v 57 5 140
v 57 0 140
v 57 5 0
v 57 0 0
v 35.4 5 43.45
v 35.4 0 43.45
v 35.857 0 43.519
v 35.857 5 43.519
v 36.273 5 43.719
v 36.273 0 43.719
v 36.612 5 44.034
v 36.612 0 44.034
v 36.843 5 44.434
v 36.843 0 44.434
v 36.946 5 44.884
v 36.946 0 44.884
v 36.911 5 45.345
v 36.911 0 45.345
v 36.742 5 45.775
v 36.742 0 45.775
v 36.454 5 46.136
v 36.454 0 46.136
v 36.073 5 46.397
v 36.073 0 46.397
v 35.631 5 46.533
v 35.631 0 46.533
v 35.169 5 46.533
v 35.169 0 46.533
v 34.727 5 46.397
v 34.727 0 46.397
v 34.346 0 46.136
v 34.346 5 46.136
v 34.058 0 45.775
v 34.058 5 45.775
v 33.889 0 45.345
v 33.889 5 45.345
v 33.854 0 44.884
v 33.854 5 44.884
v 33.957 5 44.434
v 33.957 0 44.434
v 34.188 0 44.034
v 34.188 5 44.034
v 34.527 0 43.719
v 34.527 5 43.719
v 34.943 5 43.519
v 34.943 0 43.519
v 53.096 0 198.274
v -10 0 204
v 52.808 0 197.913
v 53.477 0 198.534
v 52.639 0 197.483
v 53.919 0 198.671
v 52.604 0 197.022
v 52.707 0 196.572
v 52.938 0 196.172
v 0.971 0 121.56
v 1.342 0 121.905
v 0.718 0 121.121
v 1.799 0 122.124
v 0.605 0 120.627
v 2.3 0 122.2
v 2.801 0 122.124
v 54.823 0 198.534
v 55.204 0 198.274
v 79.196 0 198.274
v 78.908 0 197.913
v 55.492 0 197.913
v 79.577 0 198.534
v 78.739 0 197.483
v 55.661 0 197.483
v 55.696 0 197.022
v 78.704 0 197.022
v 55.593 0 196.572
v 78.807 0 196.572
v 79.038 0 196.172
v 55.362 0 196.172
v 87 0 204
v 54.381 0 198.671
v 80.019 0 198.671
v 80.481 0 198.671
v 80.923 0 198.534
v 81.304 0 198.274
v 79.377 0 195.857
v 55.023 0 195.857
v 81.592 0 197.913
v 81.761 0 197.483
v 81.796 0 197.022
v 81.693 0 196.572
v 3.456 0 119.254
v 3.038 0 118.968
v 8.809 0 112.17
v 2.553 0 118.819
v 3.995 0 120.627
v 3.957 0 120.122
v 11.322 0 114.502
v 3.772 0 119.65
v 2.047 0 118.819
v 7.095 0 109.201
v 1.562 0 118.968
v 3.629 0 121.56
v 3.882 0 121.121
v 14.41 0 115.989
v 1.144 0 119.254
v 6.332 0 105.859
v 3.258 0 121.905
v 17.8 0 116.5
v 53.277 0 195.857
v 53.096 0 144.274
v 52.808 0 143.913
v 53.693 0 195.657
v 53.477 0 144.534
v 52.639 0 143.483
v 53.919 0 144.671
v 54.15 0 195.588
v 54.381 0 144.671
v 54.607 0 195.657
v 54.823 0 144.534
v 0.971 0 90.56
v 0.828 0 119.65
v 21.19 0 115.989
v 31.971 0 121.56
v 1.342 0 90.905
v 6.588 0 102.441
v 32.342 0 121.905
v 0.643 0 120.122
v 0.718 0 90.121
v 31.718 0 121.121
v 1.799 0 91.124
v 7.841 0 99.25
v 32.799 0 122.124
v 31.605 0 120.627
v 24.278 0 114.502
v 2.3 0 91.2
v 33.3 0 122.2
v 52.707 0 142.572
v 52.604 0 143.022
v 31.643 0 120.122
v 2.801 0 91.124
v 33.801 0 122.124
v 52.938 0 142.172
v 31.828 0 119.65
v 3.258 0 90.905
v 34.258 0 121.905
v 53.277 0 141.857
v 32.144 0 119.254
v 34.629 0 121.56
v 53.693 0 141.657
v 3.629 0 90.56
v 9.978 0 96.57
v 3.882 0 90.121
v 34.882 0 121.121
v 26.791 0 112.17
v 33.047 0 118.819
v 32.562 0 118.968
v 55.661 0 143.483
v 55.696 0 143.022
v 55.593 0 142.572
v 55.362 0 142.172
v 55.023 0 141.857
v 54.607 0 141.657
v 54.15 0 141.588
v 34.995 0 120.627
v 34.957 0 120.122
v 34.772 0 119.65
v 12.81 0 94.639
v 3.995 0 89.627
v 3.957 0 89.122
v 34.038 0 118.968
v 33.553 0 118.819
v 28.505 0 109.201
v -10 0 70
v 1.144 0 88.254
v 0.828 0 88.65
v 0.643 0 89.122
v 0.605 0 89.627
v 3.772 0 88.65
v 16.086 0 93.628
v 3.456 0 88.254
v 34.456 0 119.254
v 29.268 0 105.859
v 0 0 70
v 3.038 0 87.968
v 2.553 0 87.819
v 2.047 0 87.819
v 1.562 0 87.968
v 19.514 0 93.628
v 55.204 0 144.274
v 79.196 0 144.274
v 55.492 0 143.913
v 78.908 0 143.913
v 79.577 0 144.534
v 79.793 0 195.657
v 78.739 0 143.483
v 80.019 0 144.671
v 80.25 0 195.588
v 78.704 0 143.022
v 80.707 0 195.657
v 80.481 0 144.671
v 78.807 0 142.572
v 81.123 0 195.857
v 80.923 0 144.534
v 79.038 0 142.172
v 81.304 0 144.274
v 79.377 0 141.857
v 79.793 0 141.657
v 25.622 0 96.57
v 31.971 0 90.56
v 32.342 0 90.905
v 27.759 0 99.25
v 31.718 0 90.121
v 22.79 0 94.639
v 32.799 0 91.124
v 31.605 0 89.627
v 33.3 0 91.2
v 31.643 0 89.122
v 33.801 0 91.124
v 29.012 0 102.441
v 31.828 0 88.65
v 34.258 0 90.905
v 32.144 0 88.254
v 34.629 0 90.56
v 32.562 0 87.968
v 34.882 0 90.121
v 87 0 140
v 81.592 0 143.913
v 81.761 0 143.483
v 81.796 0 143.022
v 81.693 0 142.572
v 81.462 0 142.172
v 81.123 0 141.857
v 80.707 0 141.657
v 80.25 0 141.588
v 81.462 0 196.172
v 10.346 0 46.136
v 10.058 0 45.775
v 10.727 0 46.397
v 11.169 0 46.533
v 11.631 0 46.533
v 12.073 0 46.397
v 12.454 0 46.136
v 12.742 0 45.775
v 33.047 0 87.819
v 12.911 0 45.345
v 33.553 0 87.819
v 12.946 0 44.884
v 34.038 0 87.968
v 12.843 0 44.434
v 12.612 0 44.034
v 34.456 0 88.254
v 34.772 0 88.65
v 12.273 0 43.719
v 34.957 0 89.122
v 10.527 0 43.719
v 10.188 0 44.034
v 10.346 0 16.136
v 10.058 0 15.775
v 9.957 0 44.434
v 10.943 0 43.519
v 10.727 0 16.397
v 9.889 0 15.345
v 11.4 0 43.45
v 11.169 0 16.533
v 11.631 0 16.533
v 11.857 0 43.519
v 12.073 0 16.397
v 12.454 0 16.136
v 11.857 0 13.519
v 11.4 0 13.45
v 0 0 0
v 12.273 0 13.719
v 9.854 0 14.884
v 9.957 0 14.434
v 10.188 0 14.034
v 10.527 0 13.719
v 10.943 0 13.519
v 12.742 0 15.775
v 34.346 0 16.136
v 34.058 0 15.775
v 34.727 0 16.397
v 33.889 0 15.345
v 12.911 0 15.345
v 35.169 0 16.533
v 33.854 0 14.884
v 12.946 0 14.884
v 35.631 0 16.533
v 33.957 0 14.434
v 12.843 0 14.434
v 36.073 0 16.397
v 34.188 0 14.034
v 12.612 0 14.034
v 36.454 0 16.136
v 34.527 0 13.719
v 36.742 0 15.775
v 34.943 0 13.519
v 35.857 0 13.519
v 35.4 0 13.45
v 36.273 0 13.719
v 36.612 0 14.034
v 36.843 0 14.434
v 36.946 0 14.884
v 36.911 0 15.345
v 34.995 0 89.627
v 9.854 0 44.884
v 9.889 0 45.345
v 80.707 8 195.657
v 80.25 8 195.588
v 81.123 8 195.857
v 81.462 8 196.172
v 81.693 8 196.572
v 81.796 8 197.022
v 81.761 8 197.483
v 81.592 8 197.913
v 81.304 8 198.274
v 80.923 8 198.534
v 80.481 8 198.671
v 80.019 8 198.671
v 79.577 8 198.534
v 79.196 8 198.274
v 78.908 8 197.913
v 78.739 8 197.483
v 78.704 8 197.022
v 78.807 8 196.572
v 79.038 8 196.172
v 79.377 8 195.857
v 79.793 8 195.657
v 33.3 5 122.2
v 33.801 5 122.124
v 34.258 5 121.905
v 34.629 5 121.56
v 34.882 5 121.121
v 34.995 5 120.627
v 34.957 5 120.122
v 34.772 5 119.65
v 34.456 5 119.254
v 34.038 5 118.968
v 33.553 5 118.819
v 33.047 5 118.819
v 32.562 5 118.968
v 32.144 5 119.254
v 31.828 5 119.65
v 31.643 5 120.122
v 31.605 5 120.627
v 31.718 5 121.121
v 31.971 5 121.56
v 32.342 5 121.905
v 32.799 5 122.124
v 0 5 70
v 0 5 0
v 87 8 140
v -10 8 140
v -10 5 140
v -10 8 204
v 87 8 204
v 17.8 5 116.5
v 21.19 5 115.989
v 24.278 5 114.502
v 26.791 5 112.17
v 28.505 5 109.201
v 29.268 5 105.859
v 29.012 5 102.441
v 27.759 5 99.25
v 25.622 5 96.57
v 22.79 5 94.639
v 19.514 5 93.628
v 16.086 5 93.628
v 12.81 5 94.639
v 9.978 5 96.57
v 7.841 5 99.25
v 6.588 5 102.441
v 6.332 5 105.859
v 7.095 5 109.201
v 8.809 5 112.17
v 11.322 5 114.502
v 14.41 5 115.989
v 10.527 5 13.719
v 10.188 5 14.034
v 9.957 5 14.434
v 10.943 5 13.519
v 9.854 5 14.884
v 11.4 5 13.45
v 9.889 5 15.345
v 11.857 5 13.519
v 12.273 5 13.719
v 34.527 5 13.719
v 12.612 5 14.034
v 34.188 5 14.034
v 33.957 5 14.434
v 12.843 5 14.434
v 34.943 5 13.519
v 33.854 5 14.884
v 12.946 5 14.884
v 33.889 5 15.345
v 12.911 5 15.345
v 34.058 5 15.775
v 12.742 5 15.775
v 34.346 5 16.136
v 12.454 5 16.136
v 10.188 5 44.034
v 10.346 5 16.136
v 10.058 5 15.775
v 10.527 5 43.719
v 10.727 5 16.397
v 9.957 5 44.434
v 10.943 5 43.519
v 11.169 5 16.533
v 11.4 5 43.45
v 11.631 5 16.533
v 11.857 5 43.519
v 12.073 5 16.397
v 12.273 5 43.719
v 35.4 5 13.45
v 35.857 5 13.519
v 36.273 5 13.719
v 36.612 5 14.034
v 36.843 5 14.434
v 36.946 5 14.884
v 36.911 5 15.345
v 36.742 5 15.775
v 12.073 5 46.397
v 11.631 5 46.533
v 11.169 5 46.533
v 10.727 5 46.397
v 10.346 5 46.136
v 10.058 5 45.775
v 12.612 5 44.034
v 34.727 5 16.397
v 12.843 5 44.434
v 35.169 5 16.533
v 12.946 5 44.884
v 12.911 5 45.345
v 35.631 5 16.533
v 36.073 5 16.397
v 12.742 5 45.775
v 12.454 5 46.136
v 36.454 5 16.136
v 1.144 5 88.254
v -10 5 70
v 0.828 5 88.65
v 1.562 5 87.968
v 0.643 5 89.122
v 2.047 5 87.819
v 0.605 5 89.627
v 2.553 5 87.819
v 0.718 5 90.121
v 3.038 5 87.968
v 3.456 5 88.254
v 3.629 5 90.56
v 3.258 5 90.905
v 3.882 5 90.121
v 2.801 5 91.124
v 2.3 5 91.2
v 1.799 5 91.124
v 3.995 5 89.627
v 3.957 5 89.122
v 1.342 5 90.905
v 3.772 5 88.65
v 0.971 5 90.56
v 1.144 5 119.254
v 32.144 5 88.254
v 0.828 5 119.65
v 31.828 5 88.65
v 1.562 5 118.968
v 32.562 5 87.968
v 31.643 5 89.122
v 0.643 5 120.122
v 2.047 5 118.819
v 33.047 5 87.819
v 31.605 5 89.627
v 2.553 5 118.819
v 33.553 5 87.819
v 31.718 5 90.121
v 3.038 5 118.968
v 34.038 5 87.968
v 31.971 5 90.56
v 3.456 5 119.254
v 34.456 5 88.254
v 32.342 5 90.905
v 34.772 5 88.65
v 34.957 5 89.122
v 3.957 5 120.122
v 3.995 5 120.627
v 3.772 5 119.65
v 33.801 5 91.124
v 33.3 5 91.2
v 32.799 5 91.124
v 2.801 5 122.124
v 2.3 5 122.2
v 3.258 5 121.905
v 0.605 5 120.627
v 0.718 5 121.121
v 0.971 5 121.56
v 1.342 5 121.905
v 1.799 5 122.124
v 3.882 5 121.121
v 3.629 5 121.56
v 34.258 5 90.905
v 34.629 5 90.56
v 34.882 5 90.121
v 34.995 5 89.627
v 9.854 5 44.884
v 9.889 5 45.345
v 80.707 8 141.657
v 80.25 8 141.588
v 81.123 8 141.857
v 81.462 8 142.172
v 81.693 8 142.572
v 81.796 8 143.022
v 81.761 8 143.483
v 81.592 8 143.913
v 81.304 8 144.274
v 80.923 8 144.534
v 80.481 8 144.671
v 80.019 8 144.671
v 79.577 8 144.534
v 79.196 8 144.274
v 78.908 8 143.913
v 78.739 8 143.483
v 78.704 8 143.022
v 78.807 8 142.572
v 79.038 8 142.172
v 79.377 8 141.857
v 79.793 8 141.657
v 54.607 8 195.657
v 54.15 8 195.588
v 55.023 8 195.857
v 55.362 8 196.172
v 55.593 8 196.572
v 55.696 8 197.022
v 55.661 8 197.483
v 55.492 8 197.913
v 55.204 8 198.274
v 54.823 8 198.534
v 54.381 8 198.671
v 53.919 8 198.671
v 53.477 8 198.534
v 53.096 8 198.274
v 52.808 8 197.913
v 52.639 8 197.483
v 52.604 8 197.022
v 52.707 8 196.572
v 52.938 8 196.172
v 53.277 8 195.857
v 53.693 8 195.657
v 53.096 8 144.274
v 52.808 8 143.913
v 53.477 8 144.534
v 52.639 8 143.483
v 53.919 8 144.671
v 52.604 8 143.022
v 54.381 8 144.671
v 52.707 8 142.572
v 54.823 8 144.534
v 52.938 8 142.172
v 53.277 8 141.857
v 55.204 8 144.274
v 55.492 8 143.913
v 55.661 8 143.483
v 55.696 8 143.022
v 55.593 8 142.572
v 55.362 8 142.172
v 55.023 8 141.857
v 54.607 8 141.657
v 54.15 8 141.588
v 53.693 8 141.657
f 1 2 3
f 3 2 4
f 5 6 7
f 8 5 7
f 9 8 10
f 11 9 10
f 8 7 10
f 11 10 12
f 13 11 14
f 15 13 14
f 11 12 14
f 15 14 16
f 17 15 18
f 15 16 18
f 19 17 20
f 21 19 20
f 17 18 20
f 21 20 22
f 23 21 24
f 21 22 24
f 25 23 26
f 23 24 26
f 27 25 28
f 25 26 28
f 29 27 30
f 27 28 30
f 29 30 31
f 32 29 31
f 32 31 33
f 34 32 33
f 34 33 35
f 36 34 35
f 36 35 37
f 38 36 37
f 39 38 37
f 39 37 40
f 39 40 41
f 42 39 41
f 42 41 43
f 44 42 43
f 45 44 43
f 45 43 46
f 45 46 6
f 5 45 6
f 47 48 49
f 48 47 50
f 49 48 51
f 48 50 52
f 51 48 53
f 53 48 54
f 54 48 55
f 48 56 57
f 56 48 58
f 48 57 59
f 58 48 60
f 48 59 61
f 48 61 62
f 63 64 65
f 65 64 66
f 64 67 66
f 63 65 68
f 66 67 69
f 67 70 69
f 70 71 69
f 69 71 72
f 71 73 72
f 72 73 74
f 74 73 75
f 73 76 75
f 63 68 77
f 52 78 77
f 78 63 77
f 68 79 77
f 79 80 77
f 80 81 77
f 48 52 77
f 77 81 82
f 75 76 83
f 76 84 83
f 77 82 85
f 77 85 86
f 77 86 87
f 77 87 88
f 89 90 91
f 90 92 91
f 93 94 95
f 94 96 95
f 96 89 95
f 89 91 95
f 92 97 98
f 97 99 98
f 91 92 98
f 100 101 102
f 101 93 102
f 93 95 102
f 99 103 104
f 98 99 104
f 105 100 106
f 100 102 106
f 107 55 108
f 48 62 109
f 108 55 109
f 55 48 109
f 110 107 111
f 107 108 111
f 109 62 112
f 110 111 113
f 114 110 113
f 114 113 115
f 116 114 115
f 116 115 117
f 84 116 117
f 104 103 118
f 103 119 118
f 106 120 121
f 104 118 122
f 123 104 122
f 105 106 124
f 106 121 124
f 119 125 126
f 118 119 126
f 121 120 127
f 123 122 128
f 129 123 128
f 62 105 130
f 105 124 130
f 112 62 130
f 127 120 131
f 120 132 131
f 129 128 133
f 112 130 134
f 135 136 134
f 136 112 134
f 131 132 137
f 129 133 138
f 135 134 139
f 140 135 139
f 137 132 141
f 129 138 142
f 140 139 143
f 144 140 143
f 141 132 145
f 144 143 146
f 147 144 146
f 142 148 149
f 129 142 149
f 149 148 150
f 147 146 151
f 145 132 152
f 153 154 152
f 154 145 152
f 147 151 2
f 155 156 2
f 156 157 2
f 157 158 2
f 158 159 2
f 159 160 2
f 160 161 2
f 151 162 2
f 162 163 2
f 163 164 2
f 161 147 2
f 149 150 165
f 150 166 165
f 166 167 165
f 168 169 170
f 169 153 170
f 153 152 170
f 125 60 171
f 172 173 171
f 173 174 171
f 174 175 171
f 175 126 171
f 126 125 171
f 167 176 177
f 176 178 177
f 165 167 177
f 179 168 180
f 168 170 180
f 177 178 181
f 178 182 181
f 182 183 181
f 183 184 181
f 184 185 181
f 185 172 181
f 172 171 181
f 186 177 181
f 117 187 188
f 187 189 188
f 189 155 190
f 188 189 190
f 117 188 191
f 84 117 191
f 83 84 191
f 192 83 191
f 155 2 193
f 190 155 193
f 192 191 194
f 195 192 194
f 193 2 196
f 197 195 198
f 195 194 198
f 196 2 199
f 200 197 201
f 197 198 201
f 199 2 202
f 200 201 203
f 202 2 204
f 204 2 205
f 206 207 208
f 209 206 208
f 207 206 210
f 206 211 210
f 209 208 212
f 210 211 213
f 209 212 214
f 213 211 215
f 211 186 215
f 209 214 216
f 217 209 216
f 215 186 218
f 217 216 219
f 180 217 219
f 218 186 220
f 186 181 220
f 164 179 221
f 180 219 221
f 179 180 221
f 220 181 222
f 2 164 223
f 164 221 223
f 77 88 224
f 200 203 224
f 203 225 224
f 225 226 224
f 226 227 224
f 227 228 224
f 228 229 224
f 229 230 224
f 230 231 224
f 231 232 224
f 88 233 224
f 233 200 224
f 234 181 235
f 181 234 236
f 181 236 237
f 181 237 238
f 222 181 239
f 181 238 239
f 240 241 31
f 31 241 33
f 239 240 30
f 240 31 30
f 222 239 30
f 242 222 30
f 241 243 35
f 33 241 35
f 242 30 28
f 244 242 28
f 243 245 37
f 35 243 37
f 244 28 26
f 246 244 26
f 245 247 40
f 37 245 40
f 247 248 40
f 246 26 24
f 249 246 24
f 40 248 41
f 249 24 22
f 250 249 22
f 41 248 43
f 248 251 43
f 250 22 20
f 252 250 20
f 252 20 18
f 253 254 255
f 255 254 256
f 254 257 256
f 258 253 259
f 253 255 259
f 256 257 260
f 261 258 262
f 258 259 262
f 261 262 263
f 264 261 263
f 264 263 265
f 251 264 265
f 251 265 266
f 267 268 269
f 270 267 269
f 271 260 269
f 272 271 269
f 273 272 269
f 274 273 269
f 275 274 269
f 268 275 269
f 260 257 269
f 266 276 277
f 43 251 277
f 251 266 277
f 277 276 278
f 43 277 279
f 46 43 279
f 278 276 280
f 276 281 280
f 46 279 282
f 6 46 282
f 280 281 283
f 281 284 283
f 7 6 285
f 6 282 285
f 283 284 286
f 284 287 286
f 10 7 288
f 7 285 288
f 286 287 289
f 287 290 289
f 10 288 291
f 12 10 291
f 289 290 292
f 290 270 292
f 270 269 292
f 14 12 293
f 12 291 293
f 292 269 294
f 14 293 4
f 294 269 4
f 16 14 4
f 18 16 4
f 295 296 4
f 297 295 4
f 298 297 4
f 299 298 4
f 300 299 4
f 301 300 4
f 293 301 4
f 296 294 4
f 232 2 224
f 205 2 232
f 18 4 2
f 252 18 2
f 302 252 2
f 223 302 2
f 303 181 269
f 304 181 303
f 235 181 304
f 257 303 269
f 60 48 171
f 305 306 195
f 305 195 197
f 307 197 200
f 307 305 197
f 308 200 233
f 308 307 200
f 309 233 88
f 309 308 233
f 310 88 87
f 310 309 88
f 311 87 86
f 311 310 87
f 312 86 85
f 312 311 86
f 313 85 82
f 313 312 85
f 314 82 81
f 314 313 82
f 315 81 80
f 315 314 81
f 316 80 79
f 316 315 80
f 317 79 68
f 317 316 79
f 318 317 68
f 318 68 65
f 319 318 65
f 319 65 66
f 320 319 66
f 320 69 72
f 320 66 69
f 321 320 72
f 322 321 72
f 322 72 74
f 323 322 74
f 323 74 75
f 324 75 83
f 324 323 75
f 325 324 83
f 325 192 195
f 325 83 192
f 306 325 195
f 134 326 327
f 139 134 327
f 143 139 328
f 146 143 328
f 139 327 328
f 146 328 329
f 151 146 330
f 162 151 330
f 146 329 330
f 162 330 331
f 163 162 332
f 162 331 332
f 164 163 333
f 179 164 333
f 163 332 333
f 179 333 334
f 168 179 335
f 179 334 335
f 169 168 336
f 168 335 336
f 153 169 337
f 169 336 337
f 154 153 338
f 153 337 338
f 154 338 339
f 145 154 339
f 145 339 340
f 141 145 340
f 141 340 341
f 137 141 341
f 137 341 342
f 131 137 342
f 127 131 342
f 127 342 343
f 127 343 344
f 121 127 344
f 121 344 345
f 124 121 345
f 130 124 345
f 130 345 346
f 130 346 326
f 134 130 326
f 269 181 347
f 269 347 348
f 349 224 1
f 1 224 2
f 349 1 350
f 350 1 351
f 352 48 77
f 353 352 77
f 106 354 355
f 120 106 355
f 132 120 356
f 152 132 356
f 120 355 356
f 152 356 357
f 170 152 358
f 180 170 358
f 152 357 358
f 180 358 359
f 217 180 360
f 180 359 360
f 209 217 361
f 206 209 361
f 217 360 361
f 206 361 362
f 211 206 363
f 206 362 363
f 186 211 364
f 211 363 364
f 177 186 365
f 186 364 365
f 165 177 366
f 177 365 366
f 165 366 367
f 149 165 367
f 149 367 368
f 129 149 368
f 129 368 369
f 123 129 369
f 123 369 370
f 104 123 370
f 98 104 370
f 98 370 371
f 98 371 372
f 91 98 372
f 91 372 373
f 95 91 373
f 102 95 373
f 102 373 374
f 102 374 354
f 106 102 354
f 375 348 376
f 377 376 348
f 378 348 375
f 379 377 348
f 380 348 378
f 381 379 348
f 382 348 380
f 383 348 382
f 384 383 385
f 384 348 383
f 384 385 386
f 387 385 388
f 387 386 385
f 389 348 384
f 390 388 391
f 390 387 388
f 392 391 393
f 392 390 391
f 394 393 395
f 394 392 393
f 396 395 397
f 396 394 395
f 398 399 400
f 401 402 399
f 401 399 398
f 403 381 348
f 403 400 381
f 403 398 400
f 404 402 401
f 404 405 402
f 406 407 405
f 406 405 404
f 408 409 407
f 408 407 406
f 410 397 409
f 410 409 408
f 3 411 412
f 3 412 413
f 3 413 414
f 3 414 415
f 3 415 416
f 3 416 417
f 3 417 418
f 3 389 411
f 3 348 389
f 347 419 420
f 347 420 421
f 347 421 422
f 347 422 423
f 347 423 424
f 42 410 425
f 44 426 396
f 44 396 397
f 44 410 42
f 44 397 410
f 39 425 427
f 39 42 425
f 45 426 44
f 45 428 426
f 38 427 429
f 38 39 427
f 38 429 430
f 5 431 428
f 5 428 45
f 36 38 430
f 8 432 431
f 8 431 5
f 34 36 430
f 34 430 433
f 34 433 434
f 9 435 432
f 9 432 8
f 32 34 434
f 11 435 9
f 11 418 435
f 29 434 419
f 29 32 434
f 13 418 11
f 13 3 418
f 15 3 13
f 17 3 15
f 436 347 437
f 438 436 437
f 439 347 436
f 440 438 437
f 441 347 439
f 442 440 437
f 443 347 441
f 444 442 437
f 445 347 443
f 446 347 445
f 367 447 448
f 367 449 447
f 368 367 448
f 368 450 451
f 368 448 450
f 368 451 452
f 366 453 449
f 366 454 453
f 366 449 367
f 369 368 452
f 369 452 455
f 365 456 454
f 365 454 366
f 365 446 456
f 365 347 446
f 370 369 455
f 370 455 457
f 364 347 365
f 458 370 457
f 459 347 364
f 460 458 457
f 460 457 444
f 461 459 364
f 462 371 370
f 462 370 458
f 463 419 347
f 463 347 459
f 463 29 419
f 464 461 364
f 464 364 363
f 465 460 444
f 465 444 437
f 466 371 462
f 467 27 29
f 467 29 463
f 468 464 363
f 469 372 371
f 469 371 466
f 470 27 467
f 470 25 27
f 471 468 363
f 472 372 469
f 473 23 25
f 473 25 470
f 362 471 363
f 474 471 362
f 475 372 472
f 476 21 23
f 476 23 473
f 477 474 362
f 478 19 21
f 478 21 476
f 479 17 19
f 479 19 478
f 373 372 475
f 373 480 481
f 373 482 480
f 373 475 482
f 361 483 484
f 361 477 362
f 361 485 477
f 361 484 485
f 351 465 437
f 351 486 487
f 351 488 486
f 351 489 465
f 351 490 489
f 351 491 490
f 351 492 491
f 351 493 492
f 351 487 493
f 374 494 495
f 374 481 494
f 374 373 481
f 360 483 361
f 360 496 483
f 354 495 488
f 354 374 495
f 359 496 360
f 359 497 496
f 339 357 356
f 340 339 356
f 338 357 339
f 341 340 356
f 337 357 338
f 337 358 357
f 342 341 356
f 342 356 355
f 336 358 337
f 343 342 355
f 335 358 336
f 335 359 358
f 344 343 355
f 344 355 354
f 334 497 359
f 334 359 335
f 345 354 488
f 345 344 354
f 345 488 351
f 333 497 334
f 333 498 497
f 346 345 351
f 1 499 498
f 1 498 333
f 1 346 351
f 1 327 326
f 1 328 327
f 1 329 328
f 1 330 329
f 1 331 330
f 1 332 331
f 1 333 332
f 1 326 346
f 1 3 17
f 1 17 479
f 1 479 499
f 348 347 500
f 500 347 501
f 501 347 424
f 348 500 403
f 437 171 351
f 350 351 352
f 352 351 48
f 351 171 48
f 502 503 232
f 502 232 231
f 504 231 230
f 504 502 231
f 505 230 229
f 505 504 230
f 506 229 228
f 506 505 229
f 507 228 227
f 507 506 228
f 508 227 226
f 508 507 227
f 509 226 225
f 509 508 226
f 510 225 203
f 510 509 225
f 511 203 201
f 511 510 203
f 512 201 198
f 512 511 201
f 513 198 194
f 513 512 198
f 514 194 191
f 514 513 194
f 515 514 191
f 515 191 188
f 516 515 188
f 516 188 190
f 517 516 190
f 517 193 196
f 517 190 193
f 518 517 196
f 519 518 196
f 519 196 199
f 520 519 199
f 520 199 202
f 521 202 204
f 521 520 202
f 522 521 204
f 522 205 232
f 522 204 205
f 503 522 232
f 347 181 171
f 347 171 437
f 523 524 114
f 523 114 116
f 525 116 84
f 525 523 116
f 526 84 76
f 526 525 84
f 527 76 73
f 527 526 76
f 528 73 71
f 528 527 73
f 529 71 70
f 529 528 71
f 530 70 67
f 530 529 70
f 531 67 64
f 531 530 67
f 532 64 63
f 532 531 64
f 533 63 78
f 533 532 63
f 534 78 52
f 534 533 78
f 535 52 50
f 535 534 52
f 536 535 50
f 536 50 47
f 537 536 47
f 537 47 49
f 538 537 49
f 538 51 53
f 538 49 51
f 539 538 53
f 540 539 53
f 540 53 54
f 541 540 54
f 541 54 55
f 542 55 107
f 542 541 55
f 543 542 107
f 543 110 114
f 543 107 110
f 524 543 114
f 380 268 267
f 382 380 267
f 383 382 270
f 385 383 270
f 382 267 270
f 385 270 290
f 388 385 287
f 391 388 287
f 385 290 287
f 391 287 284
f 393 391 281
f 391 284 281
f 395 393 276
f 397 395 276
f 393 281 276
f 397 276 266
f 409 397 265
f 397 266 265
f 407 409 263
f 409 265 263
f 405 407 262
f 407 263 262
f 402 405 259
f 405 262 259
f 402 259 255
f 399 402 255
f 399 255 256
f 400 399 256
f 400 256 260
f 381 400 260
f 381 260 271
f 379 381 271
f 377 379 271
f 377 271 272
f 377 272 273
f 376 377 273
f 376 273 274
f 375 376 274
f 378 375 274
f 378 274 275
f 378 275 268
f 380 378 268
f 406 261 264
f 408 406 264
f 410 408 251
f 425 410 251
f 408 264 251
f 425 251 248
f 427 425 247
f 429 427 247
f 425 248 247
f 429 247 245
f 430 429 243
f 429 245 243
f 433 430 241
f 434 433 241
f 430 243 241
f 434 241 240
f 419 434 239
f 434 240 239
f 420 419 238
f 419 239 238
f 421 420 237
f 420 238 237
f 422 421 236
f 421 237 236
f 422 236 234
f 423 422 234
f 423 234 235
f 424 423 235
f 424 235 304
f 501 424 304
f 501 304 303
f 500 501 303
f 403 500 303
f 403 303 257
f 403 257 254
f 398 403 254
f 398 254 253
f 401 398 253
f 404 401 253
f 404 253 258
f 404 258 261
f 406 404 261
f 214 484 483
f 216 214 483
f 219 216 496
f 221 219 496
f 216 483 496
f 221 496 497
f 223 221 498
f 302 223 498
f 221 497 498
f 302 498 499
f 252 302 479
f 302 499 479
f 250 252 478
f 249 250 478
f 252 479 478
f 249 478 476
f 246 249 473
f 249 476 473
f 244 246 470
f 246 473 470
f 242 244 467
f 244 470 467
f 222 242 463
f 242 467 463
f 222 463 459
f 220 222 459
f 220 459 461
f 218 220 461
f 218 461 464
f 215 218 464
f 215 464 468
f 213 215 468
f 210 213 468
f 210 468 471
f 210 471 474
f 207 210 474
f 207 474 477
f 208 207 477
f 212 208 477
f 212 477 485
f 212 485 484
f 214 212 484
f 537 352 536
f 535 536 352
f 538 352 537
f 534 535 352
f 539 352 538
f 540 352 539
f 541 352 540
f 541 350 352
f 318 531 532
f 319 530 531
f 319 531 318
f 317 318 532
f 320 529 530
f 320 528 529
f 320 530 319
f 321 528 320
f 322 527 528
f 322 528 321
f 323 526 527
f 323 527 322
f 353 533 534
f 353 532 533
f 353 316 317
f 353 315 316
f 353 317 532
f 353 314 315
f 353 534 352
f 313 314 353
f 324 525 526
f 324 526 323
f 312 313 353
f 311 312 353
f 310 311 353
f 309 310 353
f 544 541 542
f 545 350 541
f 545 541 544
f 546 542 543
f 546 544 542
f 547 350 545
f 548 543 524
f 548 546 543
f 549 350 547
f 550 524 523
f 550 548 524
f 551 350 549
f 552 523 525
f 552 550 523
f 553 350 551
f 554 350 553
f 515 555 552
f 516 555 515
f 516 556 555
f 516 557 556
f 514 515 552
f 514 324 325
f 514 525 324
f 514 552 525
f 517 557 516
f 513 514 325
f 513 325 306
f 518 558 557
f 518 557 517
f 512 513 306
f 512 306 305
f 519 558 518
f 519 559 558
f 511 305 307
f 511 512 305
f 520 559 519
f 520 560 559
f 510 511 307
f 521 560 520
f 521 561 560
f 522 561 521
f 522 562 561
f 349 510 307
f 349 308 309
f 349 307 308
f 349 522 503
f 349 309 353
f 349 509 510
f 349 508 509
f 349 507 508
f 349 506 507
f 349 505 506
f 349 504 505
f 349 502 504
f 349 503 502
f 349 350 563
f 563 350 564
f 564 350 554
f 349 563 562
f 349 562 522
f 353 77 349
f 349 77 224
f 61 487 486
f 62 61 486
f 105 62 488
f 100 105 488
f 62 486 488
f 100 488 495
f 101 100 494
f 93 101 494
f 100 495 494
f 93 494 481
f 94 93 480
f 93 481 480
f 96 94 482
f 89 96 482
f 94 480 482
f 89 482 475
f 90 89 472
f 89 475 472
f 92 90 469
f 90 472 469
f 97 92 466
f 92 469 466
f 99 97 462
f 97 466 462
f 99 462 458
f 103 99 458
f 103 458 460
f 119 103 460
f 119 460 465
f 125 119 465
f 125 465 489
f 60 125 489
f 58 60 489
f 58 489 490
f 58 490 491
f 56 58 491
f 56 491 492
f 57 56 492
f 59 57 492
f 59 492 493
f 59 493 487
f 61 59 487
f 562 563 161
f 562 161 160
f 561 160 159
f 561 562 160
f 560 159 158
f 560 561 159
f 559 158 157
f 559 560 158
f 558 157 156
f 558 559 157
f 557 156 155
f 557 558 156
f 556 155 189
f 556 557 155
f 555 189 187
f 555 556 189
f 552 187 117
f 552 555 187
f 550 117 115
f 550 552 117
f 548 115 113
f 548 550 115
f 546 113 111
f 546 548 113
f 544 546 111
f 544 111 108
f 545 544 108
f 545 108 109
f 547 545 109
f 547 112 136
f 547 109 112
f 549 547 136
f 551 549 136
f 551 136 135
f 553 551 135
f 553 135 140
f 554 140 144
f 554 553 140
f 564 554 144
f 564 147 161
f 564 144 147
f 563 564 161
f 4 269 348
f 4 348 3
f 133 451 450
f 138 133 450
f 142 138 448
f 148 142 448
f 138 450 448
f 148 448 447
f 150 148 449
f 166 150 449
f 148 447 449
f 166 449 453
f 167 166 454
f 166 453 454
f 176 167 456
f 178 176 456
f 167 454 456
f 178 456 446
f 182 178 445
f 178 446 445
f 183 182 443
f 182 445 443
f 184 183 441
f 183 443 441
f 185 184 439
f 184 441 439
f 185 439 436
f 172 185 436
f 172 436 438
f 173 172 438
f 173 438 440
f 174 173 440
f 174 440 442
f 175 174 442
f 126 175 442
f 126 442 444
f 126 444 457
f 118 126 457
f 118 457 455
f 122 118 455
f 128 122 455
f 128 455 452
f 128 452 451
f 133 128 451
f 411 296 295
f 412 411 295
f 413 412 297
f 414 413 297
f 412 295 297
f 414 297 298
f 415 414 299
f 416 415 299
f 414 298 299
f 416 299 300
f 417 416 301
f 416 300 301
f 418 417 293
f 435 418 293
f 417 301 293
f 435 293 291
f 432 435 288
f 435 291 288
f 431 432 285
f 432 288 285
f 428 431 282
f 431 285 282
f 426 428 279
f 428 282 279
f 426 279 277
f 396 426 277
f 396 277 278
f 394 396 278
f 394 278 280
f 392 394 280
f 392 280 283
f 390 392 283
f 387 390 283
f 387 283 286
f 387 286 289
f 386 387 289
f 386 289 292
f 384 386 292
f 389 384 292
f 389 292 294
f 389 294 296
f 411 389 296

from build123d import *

# Parameters (mm, degrees)
SKETCH_1_W               = 57
SKETCH_1_H               = 140
EXTRUDE_1_DEPTH          = 5
SKETCH_2_R               = 1.55
CUT_EXTRUDE_1_DEPTH      = 10
SKETCH_5_W               = 70
SKETCH_5_H               = 5
EXTRUDE_2_DEPTH          = 10
SKETCH_6_R               = 11.5
SKETCH_6_R_2             = 1.7
CUT_EXTRUDE_2_DEPTH      = 10
EXTRUDE_4_DEPTH          = 3
EXTRUDE_4_DEPTH_BACK     = 5
CUT_EXTRUDE_3_DEPTH      = 222.921157171
CUT_EXTRUDE_3_DEPTH_BACK = 222.921157171
SKETCH_8_R               = 1.55


with BuildPart() as part:
    # 草图1 → 凸台-拉伸1 (new body)
    with BuildSketch(Plane(origin=(0, 0, 0), x_dir=(1, 0, 0), z_dir=(0, 1, 0))):
        with Locations((28.5, -70)):
            Rectangle(SKETCH_1_W, SKETCH_1_H)
    extrude(amount=EXTRUDE_1_DEPTH)

    # 草图2 → 切除-拉伸1 (cut)
    with BuildSketch(Plane.XZ):
        with Locations(Location((11.4, 45, 0), (0, 0, 270))):
            Circle(SKETCH_2_R)
        with Locations(Location((11.4, 15, 0), (0, 0, 270))):
            Circle(SKETCH_2_R)
        with Locations(Location((35.4, 15, 0), (0, 0, 270))):
            Circle(SKETCH_2_R)
        with Locations(Location((35.4, 45, 0), (0, 0, 270))):
            Circle(SKETCH_2_R)
    extrude(amount=-CUT_EXTRUDE_1_DEPTH, mode=Mode.SUBTRACT)

    # 草图5 → 凸台-拉伸2 (add)
    with BuildSketch(Plane.ZY):
        with Locations((105, 2.5)):
            Rectangle(SKETCH_5_W, SKETCH_5_H)
    extrude(amount=EXTRUDE_2_DEPTH)

    # 草图6 → 切除-拉伸2 (cut)
    with BuildSketch(Plane(origin=(0, 5, 0), x_dir=(1, 0, 0), z_dir=(0, 1, 0))):
        with Locations(Location((17.8, -105, 0), (0, 0, 270))):
            Circle(SKETCH_6_R)
        with Locations(Location((33.3, -89.5, 0), (0, 0, 270))):
            Circle(SKETCH_6_R_2)
        with Locations(Location((2.3, -89.5, 0), (0, 0, 270))):
            Circle(SKETCH_6_R_2)
        with Locations(Location((2.3, -120.5, 0), (0, 0, 270))):
            Circle(SKETCH_6_R_2)
        with Locations(Location((33.3, -120.5, 0), (0, 0, 270))):
            Circle(SKETCH_6_R_2)
    extrude(amount=-CUT_EXTRUDE_2_DEPTH, mode=Mode.SUBTRACT)

    # 草图7 → 凸台-拉伸4 (add, two sides: drawn at the far end of the back side and taken through both)
    with BuildSketch(Plane(origin=(0, 5, 0), x_dir=(1, 0, 0), z_dir=(0, 1, 0)).offset(-EXTRUDE_4_DEPTH_BACK)):
        Polygon((87, -140), (57, -140), (-10, -140), (-10, -204), (87, -204), align=None)
    extrude(amount=EXTRUDE_4_DEPTH + EXTRUDE_4_DEPTH_BACK)

    # 草图8 → 切除-拉伸3 (cut, two sides: drawn at the far end of the back side and taken through both)
    with BuildSketch(Plane.XZ.offset(-CUT_EXTRUDE_3_DEPTH_BACK)):
        with Locations(Location((54.15, 197.137921192, 0), (0, 0, 270))):
            Circle(SKETCH_8_R)
        with Locations(Location((80.25, 197.137921192, 0), (0, 0, 270))):
            Circle(SKETCH_8_R)
        with Locations(Location((54.15, 143.137921192, 0), (0, 0, 270))):
            Circle(SKETCH_8_R)
        with Locations(Location((80.25, 143.137921192, 0), (0, 0, 270))):
            Circle(SKETCH_8_R)
    extrude(amount=CUT_EXTRUDE_3_DEPTH + CUT_EXTRUDE_3_DEPTH_BACK, mode=Mode.SUBTRACT)


solid = part.part
